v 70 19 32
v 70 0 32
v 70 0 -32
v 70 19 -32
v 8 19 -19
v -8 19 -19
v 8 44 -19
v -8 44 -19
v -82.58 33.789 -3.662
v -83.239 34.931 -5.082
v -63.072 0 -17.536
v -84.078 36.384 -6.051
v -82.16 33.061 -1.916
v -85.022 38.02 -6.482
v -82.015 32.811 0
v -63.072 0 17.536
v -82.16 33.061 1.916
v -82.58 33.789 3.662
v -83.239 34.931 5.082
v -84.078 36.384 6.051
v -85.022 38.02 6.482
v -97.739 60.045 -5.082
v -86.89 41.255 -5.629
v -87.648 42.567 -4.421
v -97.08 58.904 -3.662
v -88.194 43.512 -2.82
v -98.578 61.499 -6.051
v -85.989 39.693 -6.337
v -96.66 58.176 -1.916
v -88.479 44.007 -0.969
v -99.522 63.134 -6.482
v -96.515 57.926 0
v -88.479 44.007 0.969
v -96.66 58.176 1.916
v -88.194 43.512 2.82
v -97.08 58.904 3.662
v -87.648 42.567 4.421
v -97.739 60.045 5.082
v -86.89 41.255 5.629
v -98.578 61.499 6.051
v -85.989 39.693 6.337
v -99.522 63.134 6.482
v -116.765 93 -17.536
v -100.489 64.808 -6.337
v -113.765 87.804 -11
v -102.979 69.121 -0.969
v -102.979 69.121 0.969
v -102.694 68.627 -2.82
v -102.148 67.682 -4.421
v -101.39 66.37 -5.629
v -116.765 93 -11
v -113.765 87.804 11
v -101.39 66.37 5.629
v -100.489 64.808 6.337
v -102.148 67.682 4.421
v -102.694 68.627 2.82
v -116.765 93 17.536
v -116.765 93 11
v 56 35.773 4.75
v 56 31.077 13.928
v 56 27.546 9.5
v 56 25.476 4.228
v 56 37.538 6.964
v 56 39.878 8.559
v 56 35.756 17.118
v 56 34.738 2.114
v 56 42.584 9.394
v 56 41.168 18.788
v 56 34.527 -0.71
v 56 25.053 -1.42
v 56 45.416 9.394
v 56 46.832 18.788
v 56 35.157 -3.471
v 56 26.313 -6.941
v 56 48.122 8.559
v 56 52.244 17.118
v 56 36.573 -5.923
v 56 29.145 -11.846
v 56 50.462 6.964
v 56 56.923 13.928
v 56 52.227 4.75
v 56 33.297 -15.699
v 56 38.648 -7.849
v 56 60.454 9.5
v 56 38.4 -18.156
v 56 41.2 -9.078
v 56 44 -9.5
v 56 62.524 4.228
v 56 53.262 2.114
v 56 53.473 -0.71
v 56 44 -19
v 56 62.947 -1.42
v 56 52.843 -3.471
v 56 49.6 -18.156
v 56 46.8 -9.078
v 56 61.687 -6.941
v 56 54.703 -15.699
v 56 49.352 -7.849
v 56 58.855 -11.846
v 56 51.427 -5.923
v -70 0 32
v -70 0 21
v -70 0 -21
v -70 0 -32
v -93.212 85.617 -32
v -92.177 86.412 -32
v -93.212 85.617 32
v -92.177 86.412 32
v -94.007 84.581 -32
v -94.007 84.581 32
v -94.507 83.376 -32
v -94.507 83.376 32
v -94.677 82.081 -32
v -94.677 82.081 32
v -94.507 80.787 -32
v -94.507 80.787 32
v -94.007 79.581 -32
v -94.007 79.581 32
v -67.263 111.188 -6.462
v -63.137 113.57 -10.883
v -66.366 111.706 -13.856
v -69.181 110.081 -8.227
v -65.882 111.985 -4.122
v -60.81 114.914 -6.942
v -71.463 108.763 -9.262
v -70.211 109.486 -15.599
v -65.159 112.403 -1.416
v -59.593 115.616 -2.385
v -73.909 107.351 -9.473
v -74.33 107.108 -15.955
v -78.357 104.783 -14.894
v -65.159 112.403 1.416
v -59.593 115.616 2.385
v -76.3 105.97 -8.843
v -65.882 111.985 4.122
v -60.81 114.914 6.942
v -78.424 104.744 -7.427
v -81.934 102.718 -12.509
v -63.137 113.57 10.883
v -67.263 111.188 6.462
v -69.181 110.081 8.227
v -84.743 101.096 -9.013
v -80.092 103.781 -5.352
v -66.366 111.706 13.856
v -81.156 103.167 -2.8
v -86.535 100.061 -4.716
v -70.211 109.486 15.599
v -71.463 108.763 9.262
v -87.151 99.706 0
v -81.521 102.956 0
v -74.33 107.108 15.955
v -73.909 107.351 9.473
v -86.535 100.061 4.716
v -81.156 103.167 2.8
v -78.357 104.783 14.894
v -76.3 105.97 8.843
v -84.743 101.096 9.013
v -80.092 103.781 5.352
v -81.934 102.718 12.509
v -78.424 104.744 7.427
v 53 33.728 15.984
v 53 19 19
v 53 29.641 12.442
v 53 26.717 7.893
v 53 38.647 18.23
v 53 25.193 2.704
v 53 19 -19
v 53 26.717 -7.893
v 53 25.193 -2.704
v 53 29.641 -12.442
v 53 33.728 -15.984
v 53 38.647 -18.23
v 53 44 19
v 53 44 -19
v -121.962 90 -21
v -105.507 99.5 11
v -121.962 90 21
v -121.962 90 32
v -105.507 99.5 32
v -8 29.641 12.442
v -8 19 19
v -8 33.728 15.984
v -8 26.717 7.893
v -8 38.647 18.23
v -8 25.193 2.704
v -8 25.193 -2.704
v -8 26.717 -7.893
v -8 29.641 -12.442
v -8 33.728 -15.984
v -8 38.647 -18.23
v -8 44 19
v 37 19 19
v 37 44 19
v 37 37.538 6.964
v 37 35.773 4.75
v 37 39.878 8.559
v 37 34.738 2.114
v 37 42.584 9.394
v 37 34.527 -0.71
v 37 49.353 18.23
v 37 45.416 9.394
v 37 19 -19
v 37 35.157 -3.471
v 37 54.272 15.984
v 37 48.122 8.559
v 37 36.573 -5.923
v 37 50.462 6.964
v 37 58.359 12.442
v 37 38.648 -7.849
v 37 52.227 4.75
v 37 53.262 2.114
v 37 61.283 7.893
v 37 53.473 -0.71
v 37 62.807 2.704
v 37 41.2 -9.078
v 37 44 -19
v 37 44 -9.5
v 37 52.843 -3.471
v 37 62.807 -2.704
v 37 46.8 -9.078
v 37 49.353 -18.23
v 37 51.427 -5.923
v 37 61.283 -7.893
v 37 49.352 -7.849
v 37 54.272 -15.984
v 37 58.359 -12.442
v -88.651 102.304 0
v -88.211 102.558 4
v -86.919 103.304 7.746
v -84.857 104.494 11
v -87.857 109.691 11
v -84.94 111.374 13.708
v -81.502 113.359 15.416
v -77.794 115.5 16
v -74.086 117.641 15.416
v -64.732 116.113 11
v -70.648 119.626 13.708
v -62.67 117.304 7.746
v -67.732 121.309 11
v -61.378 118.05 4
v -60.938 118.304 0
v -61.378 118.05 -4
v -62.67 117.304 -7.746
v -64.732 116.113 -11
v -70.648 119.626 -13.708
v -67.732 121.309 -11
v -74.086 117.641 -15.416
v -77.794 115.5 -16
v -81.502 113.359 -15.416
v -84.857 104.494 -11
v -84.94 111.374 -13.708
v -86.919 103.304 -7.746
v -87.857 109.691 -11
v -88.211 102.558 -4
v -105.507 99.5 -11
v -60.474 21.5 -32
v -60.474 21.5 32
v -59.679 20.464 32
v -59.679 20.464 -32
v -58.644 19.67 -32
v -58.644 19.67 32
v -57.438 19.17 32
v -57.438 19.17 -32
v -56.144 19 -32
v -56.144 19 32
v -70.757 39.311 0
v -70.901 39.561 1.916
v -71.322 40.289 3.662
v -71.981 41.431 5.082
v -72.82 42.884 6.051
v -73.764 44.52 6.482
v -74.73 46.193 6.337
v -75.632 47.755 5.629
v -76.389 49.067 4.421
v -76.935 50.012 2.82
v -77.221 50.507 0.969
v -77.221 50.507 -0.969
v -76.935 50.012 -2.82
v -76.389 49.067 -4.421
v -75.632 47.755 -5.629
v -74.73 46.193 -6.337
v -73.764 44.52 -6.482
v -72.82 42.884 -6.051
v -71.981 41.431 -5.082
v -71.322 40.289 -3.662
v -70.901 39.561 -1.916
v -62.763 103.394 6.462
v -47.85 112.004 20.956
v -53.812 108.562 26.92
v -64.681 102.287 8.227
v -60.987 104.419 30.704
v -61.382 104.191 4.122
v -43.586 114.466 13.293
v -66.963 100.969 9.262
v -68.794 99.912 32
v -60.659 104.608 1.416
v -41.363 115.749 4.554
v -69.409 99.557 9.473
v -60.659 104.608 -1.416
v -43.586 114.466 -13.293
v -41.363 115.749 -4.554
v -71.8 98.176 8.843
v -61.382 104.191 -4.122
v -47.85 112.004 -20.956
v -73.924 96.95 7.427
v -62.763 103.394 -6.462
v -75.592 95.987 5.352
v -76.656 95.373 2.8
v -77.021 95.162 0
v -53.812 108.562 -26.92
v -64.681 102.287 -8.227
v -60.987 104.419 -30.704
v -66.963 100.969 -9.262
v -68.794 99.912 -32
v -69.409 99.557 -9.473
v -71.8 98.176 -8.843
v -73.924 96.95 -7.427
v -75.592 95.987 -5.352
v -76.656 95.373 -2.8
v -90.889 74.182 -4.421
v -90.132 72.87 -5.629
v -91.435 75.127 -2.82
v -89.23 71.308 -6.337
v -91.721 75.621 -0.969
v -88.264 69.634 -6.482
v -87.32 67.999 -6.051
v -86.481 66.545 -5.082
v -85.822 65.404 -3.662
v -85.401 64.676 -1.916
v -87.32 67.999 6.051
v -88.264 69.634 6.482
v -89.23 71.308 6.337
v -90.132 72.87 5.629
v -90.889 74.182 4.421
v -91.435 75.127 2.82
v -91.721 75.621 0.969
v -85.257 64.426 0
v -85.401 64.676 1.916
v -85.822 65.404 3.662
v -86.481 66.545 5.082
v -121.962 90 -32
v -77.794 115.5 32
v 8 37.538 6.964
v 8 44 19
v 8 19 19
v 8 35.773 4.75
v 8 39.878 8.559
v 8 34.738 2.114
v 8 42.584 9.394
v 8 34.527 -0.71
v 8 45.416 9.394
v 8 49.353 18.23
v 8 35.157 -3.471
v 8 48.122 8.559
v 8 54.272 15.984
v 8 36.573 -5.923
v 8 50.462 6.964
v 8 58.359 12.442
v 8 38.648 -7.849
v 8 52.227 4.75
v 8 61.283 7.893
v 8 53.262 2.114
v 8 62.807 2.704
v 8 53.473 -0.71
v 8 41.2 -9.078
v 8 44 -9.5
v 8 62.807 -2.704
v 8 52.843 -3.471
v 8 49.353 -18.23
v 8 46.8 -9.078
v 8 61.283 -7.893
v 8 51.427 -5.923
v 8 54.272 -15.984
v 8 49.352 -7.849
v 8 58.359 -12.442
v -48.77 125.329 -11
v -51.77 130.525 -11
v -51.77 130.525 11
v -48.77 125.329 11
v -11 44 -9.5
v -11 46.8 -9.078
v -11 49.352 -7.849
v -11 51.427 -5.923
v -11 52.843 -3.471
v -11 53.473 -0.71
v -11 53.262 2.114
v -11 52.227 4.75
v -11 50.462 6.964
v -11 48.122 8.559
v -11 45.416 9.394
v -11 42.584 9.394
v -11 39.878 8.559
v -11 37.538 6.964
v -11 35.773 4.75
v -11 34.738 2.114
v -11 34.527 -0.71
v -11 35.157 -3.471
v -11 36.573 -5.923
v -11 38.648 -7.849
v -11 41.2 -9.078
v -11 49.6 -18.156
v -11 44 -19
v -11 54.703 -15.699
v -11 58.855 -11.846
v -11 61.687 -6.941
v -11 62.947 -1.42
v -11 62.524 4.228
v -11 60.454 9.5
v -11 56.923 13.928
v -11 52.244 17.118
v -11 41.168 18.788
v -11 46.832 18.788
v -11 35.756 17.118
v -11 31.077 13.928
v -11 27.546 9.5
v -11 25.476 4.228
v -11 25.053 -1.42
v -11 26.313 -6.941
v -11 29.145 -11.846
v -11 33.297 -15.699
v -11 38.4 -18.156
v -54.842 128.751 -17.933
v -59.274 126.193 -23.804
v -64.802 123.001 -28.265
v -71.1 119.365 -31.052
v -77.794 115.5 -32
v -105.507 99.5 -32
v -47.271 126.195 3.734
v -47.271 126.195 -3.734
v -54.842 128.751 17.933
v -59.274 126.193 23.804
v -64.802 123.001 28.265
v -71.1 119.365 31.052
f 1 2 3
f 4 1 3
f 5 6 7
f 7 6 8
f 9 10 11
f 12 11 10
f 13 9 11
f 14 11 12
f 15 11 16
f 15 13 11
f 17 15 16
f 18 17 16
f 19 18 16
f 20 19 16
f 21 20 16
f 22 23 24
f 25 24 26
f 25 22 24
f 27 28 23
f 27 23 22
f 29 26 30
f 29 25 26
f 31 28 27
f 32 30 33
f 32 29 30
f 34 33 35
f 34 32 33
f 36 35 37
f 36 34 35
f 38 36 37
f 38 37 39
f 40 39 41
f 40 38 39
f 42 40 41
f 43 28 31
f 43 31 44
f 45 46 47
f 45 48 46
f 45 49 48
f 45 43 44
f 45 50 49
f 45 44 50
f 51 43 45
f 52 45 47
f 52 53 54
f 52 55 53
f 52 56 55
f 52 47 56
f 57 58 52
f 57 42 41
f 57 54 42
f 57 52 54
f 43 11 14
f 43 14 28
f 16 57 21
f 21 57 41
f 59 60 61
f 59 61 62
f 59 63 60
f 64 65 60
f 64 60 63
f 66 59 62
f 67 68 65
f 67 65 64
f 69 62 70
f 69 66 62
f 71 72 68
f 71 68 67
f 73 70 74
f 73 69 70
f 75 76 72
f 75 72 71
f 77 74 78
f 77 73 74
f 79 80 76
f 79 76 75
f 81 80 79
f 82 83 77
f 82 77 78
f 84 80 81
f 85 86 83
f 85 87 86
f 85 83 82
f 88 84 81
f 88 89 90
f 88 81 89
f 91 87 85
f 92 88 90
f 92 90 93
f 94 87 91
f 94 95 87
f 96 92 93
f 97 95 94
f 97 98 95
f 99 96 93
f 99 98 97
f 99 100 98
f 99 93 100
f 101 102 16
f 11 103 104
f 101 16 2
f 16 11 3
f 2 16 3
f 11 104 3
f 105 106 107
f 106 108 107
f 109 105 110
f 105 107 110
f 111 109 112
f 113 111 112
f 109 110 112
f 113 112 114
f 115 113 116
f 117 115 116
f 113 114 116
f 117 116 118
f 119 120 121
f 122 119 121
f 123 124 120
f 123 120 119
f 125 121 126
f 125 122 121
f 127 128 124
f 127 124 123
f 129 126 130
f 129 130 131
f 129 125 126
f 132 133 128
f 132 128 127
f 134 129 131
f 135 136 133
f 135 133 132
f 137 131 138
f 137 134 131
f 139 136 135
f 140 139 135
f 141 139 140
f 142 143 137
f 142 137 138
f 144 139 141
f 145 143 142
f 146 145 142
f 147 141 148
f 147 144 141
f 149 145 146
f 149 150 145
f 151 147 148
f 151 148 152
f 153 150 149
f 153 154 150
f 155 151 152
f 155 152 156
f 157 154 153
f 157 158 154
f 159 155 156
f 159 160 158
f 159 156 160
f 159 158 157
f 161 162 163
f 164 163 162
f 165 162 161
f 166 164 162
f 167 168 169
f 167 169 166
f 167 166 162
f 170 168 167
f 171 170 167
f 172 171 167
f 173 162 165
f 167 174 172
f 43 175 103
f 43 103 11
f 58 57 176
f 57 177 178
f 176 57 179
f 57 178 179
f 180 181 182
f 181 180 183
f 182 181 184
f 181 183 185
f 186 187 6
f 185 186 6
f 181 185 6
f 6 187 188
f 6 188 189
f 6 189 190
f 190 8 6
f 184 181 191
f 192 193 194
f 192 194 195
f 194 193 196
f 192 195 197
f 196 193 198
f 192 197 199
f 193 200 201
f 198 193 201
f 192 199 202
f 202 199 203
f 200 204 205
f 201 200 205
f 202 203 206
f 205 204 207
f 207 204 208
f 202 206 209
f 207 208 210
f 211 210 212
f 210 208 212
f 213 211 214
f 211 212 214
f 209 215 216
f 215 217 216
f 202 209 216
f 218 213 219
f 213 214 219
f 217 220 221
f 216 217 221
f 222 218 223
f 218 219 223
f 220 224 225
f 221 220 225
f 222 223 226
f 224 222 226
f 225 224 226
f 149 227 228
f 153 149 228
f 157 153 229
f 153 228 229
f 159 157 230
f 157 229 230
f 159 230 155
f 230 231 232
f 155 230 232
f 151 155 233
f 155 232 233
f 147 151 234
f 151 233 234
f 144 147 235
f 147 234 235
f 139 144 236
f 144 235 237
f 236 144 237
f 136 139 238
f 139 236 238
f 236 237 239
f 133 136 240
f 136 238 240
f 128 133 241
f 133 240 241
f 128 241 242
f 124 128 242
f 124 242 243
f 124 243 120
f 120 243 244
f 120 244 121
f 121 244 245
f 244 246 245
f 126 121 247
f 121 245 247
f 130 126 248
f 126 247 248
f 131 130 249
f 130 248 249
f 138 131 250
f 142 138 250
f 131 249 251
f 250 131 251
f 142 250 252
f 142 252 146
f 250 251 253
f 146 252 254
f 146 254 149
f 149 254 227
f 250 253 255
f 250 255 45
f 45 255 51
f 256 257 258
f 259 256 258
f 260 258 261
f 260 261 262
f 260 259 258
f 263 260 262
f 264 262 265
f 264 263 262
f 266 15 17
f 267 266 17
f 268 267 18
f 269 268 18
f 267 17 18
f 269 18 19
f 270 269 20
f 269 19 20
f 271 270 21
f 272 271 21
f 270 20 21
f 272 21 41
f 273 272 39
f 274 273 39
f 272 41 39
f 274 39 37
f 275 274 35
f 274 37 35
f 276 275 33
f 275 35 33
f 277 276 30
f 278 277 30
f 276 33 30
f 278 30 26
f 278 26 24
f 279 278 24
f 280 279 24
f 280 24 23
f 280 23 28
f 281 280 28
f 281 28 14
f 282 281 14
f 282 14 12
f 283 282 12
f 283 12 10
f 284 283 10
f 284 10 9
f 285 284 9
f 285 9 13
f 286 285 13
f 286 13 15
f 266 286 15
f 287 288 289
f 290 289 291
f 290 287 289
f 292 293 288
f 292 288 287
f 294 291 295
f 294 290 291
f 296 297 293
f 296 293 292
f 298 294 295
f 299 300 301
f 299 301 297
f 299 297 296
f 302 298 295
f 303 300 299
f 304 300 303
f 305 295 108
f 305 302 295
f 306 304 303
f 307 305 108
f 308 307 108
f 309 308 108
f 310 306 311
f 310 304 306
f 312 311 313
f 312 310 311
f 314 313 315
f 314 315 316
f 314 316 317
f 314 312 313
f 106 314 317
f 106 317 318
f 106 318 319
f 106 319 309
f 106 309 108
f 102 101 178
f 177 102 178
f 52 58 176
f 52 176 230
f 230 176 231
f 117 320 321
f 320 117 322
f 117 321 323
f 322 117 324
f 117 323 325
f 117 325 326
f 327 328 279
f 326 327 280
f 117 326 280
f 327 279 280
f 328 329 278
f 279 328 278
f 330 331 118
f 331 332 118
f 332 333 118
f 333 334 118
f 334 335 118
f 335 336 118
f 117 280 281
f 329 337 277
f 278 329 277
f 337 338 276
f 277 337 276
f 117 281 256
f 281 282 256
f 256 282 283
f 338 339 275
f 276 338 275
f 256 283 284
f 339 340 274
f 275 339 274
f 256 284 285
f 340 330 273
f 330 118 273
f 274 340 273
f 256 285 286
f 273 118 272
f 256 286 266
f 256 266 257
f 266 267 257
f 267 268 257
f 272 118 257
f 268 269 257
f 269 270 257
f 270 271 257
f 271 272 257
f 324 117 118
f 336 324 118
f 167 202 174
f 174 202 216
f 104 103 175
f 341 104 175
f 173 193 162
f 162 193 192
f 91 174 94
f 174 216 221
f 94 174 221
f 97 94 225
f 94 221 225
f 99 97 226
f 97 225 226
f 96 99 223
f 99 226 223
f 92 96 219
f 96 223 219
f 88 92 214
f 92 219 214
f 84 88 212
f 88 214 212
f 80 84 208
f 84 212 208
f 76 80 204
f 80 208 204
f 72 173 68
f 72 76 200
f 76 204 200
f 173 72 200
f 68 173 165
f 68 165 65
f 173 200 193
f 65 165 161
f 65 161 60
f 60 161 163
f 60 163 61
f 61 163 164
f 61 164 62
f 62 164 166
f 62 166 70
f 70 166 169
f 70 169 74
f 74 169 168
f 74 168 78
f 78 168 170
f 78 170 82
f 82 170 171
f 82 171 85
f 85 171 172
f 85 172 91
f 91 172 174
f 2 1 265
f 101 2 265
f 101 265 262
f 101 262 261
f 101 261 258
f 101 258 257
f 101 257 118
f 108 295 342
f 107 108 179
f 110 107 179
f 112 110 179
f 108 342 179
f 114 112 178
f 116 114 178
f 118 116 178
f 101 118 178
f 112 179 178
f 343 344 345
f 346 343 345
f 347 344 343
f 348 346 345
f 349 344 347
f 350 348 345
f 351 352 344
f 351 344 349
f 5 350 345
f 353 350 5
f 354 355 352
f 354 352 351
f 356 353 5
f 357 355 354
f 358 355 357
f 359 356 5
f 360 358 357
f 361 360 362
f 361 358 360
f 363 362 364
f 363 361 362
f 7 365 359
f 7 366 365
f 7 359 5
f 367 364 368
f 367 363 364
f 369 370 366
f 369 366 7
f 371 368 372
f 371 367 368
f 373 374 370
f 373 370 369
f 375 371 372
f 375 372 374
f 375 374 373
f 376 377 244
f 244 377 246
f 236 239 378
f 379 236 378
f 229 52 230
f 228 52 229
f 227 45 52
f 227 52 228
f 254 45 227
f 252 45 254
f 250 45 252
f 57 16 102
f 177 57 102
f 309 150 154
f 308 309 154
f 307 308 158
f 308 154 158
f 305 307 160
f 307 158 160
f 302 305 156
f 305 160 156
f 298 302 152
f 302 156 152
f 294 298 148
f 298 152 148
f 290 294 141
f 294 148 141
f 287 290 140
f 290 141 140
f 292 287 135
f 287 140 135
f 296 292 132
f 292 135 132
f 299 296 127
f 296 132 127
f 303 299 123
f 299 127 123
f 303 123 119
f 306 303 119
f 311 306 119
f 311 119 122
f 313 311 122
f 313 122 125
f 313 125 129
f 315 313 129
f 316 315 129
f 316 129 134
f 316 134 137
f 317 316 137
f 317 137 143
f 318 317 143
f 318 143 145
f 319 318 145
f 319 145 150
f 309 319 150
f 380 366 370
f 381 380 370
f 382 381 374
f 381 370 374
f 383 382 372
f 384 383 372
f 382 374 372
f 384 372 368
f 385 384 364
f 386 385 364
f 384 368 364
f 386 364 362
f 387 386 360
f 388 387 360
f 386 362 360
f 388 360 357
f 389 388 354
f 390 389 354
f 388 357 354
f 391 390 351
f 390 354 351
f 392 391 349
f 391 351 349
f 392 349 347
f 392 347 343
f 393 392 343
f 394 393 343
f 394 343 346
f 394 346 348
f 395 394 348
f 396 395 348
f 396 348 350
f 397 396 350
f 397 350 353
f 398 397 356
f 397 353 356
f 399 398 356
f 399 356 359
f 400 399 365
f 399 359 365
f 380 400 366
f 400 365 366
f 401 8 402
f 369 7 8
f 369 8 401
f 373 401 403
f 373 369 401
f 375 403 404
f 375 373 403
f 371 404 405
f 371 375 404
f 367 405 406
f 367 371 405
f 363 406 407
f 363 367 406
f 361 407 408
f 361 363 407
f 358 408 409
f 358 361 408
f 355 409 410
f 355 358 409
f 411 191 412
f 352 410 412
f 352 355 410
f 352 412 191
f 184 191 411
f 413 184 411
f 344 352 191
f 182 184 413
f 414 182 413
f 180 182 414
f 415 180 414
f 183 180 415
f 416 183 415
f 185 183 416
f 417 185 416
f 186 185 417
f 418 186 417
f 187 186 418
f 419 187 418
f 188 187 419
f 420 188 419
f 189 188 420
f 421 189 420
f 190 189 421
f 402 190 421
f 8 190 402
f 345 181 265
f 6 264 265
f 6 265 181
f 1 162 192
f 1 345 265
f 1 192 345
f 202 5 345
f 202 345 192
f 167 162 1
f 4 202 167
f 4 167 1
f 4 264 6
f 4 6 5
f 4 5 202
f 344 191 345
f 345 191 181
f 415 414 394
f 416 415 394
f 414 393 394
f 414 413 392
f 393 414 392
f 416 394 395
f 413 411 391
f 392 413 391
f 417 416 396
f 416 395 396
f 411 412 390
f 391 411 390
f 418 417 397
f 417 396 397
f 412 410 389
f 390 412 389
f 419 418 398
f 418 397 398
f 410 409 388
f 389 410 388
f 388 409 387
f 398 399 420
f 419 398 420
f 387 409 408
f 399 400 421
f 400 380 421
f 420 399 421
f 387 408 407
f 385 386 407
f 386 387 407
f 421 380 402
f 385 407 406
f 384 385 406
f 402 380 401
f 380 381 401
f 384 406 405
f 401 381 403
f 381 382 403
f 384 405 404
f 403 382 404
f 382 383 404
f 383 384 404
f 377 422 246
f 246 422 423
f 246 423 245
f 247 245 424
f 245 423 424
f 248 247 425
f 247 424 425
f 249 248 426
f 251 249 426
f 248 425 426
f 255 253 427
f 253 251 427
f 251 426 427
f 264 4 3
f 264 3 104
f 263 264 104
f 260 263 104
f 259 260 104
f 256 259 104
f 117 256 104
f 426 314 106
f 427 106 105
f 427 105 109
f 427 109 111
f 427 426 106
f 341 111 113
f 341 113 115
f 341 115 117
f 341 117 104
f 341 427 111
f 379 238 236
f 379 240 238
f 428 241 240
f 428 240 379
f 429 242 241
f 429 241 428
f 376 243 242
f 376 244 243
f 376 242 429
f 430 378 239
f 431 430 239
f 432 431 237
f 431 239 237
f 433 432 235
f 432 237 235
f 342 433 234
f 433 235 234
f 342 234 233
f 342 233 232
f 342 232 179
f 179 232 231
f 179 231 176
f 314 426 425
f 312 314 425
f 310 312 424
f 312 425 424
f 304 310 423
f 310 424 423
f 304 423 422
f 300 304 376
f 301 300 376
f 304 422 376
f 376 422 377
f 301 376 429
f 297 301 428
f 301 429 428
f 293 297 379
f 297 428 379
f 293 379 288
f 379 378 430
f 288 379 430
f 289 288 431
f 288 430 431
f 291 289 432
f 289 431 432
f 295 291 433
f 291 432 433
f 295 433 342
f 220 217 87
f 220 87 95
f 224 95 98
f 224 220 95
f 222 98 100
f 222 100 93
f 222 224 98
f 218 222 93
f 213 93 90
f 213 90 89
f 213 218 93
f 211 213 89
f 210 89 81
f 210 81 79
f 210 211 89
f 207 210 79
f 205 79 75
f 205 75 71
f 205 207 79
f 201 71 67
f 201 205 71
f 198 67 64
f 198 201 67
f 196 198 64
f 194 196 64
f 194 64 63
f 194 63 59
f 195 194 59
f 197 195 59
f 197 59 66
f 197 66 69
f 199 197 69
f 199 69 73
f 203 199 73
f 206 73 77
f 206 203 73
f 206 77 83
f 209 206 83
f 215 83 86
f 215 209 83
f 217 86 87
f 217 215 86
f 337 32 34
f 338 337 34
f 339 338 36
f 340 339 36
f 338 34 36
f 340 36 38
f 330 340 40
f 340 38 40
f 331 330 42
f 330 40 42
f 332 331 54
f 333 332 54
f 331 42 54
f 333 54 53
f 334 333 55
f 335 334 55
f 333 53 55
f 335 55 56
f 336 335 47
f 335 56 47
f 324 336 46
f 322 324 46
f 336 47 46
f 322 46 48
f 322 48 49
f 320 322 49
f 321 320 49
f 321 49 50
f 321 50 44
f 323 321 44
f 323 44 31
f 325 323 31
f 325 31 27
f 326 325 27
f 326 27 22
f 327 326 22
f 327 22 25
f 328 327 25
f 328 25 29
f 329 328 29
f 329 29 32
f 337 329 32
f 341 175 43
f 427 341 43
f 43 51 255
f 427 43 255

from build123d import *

# Parameters (mm, degrees)
CROQUIS1_W              = 140
CROQUIS1_H              = 64
SALIENTE_EXTRUIR1_DEPTH = 19
CROQUIS2_R              = 19
CROQUIS2_R_2            = 9.5
SALIENTE_EXTRUIR2_DEPTH = 19
SALIENTE_EXTRUIR3_DEPTH = 16
CROQUIS5_R              = 19
CROQUIS5_R_2            = 9.5
SALIENTE_EXTRUIR4_DEPTH = 19
SALIENTE_EXTRUIR5_START = -16
SALIENTE_EXTRUIR5_DEPTH = 16
SALIENTE_EXTRUIR6_DEPTH = 64
SALIENTE_EXTRUIR9_DEPTH = 18
CROQUIS14_R             = 16
CORTAR_EXTRUIR1_DEPTH   = 9
CROQUIS16_R             = 9.5
CORTAR_EXTRUIR2_DEPTH   = 19
CORTAR_EXTRUIR3_DEPTH   = 6
CORTAR_EXTRUIR4_DEPTH   = 187.944448389
CROQUIS19_R             = 6.5
CORTAR_EXTRUIR5_DEPTH   = 200.23943884
REDONDEO1_R             = 5


with BuildPart() as part:
    # Croquis1 → Saliente-Extruir1 (new body)
    with BuildSketch(Plane(origin=(0, 0, 0), x_dir=(1, 0, 0), z_dir=(0, 1, 0))):
        Rectangle(CROQUIS1_W, CROQUIS1_H)
    extrude(amount=SALIENTE_EXTRUIR1_DEPTH)



with BuildPart() as body_2:
    # Croquis2 → Saliente-Extruir2 (new body)
    with BuildSketch(Plane(origin=(37, 0, 0), x_dir=(0, 0, -1), z_dir=(1, 0, 0))):
        with Locations((0, 44)):
            Circle(CROQUIS2_R)
        with Locations((0, 44)):
            Circle(CROQUIS2_R_2, mode=Mode.SUBTRACT)
    extrude(amount=SALIENTE_EXTRUIR2_DEPTH)


with BuildPart() as part_1:
    add(part.part)

    add(body_2.part)  # Saliente-Extruir3 merges body 2
    # Croquis4 → Saliente-Extruir3 (add)
    with BuildSketch(Plane(origin=(37, 0, 0), x_dir=(0, 0, -1), z_dir=(1, 0, 0))):
        with BuildLine():
            ThreePointArc((19, 44), (0, 25), (-19, 44))
            Line((-19, 44), (-19, 19))
            Line((-19, 19), (19, 19))
            Line((19, 19), (19, 44))
        make_face()
    extrude(amount=SALIENTE_EXTRUIR3_DEPTH)



with BuildPart() as body_2_2:
    # Croquis5 → Saliente-Extruir4 (new body)
    with BuildSketch(Plane(origin=(8, 0, 0), x_dir=(0, 0, -1), z_dir=(1, 0, 0))):
        with Locations((0, 44)):
            Circle(CROQUIS5_R)
        with Locations((0, 44)):
            Circle(CROQUIS5_R_2, mode=Mode.SUBTRACT)
    extrude(amount=-SALIENTE_EXTRUIR4_DEPTH)


with BuildPart() as part_2:
    add(part_1.part)

    add(body_2_2.part)  # Saliente-Extruir5 merges body 2 2
    # Croquis6 → Saliente-Extruir5 (add)
    with BuildSketch(Plane(origin=(8, 0, 0), x_dir=(0, 0, -1), z_dir=(1, 0, 0)).offset(SALIENTE_EXTRUIR5_START)):
        with BuildLine():
            Line((19, 19), (19, 44))
            ThreePointArc((19, 44), (0, 25), (-19, 44))
            Line((-19, 44), (-19, 19))
            Line((-19, 19), (19, 19))
        make_face()
    extrude(amount=SALIENTE_EXTRUIR5_DEPTH)

    # Croquis7 → Saliente-Extruir6 (add)
    with BuildSketch(Plane.XY.offset(32)):
        Polygon((-70, 0), (-121.961524227, 90), (-105.507041555, 99.5), (-59.030344885, 19), (-70, 19), align=None)
    extrude(amount=-SALIENTE_EXTRUIR6_DEPTH)

    # Croquis9 → Saliente-Extruir9 (add)
    with BuildSketch(Plane(origin=(-69.461524227, 120.310889132, 0), x_dir=(0.8660254037844397, 0.4999999999999982, 0), z_dir=(-0.4999999999999983, 0.8660254037844398, 0))):
        with BuildLine():
            Line((-60.621778265, 32), (-9.621778265, 32))
            ThreePointArc((-9.621778265, 32), (22.378221735, 0), (-9.621778265, -32))
            Line((-9.621778265, -32), (-60.621778265, -32))
            Line((-60.621778265, -32), (-60.621778265, 32))
        make_face()
    extrude(amount=-SALIENTE_EXTRUIR9_DEPTH)

    # Croquis14 → Cortar-Extruir1 (cut)
    with BuildSketch(Plane(origin=(-69.461524227, 120.310889132, 0), x_dir=(0.8660254037844397, 0.4999999999999982, 0), z_dir=(-0.4999999999999983, 0.8660254037844398, 0))):
        with Locations(Location((-9.621778265, 0, 0), (0, 0, 180))):
            Circle(CROQUIS14_R)
    extrude(amount=-CORTAR_EXTRUIR1_DEPTH, mode=Mode.SUBTRACT)

    # Croquis16 → Cortar-Extruir2 (cut)
    with BuildSketch(Plane(origin=(-69.461524227, 120.310889132, 0), x_dir=(0.8660254037844397, 0.4999999999999982, 0), z_dir=(-0.4999999999999983, 0.8660254037844398, 0))):
        with Locations(Location((-9.621778265, 0, 0), (0, 0, 180))):
            Circle(CROQUIS16_R)
    extrude(amount=-CORTAR_EXTRUIR2_DEPTH, mode=Mode.SUBTRACT)

    # Croquis17 → Cortar-Extruir3 (cut)
    with BuildSketch(Plane(origin=(-69.461524227, 120.310889132, 0), x_dir=(0.8660254037844397, 0.4999999999999982, 0), z_dir=(-0.4999999999999983, 0.8660254037844398, 0))):
        with BuildLine():
            Line((-60.621778265, -11), (20.428180138, -11))
            ThreePointArc((20.428180138, -11), (22.378221735, 0), (20.428180138, 11))
            Line((20.428180138, 11), (-60.621778265, 11))
            Line((-60.621778265, 11), (-60.621778265, -11))
        make_face()
    extrude(amount=-CORTAR_EXTRUIR3_DEPTH, mode=Mode.SUBTRACT)

    # Croquis18 → Cortar-Extruir4 (cut, through all)
    with BuildSketch(Plane(origin=(-69.461524227, 120.310889132, 0), x_dir=(0.8660254037844397, 0.4999999999999982, 0), z_dir=(-0.4999999999999983, 0.8660254037844398, 0))):
        Polygon((-60.621778265, 21), (-54.621778265, 17.535898385), (-54.621778265, -17.535898385), (-60.621778265, -21), align=None)
    extrude(amount=-CORTAR_EXTRUIR4_DEPTH, mode=Mode.SUBTRACT)

    # Croquis19 → Cortar-Extruir5 (cut, through all)
    with BuildSketch(Plane(origin=(-47.303847577, -27.310889132, 0), x_dir=(0, 0, 1), z_dir=(-0.8660254037844396, -0.4999999999999983, 0))):
        with Locations(Location((0, 104.923048454, 0), (0, 0, 270))):
            Circle(CROQUIS19_R)
        with Locations(Location((0, 75.923048454, 0), (0, 0, 270))):
            Circle(CROQUIS19_R)
    extrude(amount=-CORTAR_EXTRUIR5_DEPTH, mode=Mode.SUBTRACT)

    # Redondeo1
    redondeo1_edges = [part_2.edges().sort_by_distance(p)[0] for p in [
        (-59.030344885, 19, 0),
        (-96.507041555, 83.911542732, 0),
    ]]
    fillet(redondeo1_edges, radius=REDONDEO1_R)


solid = part_2.part
